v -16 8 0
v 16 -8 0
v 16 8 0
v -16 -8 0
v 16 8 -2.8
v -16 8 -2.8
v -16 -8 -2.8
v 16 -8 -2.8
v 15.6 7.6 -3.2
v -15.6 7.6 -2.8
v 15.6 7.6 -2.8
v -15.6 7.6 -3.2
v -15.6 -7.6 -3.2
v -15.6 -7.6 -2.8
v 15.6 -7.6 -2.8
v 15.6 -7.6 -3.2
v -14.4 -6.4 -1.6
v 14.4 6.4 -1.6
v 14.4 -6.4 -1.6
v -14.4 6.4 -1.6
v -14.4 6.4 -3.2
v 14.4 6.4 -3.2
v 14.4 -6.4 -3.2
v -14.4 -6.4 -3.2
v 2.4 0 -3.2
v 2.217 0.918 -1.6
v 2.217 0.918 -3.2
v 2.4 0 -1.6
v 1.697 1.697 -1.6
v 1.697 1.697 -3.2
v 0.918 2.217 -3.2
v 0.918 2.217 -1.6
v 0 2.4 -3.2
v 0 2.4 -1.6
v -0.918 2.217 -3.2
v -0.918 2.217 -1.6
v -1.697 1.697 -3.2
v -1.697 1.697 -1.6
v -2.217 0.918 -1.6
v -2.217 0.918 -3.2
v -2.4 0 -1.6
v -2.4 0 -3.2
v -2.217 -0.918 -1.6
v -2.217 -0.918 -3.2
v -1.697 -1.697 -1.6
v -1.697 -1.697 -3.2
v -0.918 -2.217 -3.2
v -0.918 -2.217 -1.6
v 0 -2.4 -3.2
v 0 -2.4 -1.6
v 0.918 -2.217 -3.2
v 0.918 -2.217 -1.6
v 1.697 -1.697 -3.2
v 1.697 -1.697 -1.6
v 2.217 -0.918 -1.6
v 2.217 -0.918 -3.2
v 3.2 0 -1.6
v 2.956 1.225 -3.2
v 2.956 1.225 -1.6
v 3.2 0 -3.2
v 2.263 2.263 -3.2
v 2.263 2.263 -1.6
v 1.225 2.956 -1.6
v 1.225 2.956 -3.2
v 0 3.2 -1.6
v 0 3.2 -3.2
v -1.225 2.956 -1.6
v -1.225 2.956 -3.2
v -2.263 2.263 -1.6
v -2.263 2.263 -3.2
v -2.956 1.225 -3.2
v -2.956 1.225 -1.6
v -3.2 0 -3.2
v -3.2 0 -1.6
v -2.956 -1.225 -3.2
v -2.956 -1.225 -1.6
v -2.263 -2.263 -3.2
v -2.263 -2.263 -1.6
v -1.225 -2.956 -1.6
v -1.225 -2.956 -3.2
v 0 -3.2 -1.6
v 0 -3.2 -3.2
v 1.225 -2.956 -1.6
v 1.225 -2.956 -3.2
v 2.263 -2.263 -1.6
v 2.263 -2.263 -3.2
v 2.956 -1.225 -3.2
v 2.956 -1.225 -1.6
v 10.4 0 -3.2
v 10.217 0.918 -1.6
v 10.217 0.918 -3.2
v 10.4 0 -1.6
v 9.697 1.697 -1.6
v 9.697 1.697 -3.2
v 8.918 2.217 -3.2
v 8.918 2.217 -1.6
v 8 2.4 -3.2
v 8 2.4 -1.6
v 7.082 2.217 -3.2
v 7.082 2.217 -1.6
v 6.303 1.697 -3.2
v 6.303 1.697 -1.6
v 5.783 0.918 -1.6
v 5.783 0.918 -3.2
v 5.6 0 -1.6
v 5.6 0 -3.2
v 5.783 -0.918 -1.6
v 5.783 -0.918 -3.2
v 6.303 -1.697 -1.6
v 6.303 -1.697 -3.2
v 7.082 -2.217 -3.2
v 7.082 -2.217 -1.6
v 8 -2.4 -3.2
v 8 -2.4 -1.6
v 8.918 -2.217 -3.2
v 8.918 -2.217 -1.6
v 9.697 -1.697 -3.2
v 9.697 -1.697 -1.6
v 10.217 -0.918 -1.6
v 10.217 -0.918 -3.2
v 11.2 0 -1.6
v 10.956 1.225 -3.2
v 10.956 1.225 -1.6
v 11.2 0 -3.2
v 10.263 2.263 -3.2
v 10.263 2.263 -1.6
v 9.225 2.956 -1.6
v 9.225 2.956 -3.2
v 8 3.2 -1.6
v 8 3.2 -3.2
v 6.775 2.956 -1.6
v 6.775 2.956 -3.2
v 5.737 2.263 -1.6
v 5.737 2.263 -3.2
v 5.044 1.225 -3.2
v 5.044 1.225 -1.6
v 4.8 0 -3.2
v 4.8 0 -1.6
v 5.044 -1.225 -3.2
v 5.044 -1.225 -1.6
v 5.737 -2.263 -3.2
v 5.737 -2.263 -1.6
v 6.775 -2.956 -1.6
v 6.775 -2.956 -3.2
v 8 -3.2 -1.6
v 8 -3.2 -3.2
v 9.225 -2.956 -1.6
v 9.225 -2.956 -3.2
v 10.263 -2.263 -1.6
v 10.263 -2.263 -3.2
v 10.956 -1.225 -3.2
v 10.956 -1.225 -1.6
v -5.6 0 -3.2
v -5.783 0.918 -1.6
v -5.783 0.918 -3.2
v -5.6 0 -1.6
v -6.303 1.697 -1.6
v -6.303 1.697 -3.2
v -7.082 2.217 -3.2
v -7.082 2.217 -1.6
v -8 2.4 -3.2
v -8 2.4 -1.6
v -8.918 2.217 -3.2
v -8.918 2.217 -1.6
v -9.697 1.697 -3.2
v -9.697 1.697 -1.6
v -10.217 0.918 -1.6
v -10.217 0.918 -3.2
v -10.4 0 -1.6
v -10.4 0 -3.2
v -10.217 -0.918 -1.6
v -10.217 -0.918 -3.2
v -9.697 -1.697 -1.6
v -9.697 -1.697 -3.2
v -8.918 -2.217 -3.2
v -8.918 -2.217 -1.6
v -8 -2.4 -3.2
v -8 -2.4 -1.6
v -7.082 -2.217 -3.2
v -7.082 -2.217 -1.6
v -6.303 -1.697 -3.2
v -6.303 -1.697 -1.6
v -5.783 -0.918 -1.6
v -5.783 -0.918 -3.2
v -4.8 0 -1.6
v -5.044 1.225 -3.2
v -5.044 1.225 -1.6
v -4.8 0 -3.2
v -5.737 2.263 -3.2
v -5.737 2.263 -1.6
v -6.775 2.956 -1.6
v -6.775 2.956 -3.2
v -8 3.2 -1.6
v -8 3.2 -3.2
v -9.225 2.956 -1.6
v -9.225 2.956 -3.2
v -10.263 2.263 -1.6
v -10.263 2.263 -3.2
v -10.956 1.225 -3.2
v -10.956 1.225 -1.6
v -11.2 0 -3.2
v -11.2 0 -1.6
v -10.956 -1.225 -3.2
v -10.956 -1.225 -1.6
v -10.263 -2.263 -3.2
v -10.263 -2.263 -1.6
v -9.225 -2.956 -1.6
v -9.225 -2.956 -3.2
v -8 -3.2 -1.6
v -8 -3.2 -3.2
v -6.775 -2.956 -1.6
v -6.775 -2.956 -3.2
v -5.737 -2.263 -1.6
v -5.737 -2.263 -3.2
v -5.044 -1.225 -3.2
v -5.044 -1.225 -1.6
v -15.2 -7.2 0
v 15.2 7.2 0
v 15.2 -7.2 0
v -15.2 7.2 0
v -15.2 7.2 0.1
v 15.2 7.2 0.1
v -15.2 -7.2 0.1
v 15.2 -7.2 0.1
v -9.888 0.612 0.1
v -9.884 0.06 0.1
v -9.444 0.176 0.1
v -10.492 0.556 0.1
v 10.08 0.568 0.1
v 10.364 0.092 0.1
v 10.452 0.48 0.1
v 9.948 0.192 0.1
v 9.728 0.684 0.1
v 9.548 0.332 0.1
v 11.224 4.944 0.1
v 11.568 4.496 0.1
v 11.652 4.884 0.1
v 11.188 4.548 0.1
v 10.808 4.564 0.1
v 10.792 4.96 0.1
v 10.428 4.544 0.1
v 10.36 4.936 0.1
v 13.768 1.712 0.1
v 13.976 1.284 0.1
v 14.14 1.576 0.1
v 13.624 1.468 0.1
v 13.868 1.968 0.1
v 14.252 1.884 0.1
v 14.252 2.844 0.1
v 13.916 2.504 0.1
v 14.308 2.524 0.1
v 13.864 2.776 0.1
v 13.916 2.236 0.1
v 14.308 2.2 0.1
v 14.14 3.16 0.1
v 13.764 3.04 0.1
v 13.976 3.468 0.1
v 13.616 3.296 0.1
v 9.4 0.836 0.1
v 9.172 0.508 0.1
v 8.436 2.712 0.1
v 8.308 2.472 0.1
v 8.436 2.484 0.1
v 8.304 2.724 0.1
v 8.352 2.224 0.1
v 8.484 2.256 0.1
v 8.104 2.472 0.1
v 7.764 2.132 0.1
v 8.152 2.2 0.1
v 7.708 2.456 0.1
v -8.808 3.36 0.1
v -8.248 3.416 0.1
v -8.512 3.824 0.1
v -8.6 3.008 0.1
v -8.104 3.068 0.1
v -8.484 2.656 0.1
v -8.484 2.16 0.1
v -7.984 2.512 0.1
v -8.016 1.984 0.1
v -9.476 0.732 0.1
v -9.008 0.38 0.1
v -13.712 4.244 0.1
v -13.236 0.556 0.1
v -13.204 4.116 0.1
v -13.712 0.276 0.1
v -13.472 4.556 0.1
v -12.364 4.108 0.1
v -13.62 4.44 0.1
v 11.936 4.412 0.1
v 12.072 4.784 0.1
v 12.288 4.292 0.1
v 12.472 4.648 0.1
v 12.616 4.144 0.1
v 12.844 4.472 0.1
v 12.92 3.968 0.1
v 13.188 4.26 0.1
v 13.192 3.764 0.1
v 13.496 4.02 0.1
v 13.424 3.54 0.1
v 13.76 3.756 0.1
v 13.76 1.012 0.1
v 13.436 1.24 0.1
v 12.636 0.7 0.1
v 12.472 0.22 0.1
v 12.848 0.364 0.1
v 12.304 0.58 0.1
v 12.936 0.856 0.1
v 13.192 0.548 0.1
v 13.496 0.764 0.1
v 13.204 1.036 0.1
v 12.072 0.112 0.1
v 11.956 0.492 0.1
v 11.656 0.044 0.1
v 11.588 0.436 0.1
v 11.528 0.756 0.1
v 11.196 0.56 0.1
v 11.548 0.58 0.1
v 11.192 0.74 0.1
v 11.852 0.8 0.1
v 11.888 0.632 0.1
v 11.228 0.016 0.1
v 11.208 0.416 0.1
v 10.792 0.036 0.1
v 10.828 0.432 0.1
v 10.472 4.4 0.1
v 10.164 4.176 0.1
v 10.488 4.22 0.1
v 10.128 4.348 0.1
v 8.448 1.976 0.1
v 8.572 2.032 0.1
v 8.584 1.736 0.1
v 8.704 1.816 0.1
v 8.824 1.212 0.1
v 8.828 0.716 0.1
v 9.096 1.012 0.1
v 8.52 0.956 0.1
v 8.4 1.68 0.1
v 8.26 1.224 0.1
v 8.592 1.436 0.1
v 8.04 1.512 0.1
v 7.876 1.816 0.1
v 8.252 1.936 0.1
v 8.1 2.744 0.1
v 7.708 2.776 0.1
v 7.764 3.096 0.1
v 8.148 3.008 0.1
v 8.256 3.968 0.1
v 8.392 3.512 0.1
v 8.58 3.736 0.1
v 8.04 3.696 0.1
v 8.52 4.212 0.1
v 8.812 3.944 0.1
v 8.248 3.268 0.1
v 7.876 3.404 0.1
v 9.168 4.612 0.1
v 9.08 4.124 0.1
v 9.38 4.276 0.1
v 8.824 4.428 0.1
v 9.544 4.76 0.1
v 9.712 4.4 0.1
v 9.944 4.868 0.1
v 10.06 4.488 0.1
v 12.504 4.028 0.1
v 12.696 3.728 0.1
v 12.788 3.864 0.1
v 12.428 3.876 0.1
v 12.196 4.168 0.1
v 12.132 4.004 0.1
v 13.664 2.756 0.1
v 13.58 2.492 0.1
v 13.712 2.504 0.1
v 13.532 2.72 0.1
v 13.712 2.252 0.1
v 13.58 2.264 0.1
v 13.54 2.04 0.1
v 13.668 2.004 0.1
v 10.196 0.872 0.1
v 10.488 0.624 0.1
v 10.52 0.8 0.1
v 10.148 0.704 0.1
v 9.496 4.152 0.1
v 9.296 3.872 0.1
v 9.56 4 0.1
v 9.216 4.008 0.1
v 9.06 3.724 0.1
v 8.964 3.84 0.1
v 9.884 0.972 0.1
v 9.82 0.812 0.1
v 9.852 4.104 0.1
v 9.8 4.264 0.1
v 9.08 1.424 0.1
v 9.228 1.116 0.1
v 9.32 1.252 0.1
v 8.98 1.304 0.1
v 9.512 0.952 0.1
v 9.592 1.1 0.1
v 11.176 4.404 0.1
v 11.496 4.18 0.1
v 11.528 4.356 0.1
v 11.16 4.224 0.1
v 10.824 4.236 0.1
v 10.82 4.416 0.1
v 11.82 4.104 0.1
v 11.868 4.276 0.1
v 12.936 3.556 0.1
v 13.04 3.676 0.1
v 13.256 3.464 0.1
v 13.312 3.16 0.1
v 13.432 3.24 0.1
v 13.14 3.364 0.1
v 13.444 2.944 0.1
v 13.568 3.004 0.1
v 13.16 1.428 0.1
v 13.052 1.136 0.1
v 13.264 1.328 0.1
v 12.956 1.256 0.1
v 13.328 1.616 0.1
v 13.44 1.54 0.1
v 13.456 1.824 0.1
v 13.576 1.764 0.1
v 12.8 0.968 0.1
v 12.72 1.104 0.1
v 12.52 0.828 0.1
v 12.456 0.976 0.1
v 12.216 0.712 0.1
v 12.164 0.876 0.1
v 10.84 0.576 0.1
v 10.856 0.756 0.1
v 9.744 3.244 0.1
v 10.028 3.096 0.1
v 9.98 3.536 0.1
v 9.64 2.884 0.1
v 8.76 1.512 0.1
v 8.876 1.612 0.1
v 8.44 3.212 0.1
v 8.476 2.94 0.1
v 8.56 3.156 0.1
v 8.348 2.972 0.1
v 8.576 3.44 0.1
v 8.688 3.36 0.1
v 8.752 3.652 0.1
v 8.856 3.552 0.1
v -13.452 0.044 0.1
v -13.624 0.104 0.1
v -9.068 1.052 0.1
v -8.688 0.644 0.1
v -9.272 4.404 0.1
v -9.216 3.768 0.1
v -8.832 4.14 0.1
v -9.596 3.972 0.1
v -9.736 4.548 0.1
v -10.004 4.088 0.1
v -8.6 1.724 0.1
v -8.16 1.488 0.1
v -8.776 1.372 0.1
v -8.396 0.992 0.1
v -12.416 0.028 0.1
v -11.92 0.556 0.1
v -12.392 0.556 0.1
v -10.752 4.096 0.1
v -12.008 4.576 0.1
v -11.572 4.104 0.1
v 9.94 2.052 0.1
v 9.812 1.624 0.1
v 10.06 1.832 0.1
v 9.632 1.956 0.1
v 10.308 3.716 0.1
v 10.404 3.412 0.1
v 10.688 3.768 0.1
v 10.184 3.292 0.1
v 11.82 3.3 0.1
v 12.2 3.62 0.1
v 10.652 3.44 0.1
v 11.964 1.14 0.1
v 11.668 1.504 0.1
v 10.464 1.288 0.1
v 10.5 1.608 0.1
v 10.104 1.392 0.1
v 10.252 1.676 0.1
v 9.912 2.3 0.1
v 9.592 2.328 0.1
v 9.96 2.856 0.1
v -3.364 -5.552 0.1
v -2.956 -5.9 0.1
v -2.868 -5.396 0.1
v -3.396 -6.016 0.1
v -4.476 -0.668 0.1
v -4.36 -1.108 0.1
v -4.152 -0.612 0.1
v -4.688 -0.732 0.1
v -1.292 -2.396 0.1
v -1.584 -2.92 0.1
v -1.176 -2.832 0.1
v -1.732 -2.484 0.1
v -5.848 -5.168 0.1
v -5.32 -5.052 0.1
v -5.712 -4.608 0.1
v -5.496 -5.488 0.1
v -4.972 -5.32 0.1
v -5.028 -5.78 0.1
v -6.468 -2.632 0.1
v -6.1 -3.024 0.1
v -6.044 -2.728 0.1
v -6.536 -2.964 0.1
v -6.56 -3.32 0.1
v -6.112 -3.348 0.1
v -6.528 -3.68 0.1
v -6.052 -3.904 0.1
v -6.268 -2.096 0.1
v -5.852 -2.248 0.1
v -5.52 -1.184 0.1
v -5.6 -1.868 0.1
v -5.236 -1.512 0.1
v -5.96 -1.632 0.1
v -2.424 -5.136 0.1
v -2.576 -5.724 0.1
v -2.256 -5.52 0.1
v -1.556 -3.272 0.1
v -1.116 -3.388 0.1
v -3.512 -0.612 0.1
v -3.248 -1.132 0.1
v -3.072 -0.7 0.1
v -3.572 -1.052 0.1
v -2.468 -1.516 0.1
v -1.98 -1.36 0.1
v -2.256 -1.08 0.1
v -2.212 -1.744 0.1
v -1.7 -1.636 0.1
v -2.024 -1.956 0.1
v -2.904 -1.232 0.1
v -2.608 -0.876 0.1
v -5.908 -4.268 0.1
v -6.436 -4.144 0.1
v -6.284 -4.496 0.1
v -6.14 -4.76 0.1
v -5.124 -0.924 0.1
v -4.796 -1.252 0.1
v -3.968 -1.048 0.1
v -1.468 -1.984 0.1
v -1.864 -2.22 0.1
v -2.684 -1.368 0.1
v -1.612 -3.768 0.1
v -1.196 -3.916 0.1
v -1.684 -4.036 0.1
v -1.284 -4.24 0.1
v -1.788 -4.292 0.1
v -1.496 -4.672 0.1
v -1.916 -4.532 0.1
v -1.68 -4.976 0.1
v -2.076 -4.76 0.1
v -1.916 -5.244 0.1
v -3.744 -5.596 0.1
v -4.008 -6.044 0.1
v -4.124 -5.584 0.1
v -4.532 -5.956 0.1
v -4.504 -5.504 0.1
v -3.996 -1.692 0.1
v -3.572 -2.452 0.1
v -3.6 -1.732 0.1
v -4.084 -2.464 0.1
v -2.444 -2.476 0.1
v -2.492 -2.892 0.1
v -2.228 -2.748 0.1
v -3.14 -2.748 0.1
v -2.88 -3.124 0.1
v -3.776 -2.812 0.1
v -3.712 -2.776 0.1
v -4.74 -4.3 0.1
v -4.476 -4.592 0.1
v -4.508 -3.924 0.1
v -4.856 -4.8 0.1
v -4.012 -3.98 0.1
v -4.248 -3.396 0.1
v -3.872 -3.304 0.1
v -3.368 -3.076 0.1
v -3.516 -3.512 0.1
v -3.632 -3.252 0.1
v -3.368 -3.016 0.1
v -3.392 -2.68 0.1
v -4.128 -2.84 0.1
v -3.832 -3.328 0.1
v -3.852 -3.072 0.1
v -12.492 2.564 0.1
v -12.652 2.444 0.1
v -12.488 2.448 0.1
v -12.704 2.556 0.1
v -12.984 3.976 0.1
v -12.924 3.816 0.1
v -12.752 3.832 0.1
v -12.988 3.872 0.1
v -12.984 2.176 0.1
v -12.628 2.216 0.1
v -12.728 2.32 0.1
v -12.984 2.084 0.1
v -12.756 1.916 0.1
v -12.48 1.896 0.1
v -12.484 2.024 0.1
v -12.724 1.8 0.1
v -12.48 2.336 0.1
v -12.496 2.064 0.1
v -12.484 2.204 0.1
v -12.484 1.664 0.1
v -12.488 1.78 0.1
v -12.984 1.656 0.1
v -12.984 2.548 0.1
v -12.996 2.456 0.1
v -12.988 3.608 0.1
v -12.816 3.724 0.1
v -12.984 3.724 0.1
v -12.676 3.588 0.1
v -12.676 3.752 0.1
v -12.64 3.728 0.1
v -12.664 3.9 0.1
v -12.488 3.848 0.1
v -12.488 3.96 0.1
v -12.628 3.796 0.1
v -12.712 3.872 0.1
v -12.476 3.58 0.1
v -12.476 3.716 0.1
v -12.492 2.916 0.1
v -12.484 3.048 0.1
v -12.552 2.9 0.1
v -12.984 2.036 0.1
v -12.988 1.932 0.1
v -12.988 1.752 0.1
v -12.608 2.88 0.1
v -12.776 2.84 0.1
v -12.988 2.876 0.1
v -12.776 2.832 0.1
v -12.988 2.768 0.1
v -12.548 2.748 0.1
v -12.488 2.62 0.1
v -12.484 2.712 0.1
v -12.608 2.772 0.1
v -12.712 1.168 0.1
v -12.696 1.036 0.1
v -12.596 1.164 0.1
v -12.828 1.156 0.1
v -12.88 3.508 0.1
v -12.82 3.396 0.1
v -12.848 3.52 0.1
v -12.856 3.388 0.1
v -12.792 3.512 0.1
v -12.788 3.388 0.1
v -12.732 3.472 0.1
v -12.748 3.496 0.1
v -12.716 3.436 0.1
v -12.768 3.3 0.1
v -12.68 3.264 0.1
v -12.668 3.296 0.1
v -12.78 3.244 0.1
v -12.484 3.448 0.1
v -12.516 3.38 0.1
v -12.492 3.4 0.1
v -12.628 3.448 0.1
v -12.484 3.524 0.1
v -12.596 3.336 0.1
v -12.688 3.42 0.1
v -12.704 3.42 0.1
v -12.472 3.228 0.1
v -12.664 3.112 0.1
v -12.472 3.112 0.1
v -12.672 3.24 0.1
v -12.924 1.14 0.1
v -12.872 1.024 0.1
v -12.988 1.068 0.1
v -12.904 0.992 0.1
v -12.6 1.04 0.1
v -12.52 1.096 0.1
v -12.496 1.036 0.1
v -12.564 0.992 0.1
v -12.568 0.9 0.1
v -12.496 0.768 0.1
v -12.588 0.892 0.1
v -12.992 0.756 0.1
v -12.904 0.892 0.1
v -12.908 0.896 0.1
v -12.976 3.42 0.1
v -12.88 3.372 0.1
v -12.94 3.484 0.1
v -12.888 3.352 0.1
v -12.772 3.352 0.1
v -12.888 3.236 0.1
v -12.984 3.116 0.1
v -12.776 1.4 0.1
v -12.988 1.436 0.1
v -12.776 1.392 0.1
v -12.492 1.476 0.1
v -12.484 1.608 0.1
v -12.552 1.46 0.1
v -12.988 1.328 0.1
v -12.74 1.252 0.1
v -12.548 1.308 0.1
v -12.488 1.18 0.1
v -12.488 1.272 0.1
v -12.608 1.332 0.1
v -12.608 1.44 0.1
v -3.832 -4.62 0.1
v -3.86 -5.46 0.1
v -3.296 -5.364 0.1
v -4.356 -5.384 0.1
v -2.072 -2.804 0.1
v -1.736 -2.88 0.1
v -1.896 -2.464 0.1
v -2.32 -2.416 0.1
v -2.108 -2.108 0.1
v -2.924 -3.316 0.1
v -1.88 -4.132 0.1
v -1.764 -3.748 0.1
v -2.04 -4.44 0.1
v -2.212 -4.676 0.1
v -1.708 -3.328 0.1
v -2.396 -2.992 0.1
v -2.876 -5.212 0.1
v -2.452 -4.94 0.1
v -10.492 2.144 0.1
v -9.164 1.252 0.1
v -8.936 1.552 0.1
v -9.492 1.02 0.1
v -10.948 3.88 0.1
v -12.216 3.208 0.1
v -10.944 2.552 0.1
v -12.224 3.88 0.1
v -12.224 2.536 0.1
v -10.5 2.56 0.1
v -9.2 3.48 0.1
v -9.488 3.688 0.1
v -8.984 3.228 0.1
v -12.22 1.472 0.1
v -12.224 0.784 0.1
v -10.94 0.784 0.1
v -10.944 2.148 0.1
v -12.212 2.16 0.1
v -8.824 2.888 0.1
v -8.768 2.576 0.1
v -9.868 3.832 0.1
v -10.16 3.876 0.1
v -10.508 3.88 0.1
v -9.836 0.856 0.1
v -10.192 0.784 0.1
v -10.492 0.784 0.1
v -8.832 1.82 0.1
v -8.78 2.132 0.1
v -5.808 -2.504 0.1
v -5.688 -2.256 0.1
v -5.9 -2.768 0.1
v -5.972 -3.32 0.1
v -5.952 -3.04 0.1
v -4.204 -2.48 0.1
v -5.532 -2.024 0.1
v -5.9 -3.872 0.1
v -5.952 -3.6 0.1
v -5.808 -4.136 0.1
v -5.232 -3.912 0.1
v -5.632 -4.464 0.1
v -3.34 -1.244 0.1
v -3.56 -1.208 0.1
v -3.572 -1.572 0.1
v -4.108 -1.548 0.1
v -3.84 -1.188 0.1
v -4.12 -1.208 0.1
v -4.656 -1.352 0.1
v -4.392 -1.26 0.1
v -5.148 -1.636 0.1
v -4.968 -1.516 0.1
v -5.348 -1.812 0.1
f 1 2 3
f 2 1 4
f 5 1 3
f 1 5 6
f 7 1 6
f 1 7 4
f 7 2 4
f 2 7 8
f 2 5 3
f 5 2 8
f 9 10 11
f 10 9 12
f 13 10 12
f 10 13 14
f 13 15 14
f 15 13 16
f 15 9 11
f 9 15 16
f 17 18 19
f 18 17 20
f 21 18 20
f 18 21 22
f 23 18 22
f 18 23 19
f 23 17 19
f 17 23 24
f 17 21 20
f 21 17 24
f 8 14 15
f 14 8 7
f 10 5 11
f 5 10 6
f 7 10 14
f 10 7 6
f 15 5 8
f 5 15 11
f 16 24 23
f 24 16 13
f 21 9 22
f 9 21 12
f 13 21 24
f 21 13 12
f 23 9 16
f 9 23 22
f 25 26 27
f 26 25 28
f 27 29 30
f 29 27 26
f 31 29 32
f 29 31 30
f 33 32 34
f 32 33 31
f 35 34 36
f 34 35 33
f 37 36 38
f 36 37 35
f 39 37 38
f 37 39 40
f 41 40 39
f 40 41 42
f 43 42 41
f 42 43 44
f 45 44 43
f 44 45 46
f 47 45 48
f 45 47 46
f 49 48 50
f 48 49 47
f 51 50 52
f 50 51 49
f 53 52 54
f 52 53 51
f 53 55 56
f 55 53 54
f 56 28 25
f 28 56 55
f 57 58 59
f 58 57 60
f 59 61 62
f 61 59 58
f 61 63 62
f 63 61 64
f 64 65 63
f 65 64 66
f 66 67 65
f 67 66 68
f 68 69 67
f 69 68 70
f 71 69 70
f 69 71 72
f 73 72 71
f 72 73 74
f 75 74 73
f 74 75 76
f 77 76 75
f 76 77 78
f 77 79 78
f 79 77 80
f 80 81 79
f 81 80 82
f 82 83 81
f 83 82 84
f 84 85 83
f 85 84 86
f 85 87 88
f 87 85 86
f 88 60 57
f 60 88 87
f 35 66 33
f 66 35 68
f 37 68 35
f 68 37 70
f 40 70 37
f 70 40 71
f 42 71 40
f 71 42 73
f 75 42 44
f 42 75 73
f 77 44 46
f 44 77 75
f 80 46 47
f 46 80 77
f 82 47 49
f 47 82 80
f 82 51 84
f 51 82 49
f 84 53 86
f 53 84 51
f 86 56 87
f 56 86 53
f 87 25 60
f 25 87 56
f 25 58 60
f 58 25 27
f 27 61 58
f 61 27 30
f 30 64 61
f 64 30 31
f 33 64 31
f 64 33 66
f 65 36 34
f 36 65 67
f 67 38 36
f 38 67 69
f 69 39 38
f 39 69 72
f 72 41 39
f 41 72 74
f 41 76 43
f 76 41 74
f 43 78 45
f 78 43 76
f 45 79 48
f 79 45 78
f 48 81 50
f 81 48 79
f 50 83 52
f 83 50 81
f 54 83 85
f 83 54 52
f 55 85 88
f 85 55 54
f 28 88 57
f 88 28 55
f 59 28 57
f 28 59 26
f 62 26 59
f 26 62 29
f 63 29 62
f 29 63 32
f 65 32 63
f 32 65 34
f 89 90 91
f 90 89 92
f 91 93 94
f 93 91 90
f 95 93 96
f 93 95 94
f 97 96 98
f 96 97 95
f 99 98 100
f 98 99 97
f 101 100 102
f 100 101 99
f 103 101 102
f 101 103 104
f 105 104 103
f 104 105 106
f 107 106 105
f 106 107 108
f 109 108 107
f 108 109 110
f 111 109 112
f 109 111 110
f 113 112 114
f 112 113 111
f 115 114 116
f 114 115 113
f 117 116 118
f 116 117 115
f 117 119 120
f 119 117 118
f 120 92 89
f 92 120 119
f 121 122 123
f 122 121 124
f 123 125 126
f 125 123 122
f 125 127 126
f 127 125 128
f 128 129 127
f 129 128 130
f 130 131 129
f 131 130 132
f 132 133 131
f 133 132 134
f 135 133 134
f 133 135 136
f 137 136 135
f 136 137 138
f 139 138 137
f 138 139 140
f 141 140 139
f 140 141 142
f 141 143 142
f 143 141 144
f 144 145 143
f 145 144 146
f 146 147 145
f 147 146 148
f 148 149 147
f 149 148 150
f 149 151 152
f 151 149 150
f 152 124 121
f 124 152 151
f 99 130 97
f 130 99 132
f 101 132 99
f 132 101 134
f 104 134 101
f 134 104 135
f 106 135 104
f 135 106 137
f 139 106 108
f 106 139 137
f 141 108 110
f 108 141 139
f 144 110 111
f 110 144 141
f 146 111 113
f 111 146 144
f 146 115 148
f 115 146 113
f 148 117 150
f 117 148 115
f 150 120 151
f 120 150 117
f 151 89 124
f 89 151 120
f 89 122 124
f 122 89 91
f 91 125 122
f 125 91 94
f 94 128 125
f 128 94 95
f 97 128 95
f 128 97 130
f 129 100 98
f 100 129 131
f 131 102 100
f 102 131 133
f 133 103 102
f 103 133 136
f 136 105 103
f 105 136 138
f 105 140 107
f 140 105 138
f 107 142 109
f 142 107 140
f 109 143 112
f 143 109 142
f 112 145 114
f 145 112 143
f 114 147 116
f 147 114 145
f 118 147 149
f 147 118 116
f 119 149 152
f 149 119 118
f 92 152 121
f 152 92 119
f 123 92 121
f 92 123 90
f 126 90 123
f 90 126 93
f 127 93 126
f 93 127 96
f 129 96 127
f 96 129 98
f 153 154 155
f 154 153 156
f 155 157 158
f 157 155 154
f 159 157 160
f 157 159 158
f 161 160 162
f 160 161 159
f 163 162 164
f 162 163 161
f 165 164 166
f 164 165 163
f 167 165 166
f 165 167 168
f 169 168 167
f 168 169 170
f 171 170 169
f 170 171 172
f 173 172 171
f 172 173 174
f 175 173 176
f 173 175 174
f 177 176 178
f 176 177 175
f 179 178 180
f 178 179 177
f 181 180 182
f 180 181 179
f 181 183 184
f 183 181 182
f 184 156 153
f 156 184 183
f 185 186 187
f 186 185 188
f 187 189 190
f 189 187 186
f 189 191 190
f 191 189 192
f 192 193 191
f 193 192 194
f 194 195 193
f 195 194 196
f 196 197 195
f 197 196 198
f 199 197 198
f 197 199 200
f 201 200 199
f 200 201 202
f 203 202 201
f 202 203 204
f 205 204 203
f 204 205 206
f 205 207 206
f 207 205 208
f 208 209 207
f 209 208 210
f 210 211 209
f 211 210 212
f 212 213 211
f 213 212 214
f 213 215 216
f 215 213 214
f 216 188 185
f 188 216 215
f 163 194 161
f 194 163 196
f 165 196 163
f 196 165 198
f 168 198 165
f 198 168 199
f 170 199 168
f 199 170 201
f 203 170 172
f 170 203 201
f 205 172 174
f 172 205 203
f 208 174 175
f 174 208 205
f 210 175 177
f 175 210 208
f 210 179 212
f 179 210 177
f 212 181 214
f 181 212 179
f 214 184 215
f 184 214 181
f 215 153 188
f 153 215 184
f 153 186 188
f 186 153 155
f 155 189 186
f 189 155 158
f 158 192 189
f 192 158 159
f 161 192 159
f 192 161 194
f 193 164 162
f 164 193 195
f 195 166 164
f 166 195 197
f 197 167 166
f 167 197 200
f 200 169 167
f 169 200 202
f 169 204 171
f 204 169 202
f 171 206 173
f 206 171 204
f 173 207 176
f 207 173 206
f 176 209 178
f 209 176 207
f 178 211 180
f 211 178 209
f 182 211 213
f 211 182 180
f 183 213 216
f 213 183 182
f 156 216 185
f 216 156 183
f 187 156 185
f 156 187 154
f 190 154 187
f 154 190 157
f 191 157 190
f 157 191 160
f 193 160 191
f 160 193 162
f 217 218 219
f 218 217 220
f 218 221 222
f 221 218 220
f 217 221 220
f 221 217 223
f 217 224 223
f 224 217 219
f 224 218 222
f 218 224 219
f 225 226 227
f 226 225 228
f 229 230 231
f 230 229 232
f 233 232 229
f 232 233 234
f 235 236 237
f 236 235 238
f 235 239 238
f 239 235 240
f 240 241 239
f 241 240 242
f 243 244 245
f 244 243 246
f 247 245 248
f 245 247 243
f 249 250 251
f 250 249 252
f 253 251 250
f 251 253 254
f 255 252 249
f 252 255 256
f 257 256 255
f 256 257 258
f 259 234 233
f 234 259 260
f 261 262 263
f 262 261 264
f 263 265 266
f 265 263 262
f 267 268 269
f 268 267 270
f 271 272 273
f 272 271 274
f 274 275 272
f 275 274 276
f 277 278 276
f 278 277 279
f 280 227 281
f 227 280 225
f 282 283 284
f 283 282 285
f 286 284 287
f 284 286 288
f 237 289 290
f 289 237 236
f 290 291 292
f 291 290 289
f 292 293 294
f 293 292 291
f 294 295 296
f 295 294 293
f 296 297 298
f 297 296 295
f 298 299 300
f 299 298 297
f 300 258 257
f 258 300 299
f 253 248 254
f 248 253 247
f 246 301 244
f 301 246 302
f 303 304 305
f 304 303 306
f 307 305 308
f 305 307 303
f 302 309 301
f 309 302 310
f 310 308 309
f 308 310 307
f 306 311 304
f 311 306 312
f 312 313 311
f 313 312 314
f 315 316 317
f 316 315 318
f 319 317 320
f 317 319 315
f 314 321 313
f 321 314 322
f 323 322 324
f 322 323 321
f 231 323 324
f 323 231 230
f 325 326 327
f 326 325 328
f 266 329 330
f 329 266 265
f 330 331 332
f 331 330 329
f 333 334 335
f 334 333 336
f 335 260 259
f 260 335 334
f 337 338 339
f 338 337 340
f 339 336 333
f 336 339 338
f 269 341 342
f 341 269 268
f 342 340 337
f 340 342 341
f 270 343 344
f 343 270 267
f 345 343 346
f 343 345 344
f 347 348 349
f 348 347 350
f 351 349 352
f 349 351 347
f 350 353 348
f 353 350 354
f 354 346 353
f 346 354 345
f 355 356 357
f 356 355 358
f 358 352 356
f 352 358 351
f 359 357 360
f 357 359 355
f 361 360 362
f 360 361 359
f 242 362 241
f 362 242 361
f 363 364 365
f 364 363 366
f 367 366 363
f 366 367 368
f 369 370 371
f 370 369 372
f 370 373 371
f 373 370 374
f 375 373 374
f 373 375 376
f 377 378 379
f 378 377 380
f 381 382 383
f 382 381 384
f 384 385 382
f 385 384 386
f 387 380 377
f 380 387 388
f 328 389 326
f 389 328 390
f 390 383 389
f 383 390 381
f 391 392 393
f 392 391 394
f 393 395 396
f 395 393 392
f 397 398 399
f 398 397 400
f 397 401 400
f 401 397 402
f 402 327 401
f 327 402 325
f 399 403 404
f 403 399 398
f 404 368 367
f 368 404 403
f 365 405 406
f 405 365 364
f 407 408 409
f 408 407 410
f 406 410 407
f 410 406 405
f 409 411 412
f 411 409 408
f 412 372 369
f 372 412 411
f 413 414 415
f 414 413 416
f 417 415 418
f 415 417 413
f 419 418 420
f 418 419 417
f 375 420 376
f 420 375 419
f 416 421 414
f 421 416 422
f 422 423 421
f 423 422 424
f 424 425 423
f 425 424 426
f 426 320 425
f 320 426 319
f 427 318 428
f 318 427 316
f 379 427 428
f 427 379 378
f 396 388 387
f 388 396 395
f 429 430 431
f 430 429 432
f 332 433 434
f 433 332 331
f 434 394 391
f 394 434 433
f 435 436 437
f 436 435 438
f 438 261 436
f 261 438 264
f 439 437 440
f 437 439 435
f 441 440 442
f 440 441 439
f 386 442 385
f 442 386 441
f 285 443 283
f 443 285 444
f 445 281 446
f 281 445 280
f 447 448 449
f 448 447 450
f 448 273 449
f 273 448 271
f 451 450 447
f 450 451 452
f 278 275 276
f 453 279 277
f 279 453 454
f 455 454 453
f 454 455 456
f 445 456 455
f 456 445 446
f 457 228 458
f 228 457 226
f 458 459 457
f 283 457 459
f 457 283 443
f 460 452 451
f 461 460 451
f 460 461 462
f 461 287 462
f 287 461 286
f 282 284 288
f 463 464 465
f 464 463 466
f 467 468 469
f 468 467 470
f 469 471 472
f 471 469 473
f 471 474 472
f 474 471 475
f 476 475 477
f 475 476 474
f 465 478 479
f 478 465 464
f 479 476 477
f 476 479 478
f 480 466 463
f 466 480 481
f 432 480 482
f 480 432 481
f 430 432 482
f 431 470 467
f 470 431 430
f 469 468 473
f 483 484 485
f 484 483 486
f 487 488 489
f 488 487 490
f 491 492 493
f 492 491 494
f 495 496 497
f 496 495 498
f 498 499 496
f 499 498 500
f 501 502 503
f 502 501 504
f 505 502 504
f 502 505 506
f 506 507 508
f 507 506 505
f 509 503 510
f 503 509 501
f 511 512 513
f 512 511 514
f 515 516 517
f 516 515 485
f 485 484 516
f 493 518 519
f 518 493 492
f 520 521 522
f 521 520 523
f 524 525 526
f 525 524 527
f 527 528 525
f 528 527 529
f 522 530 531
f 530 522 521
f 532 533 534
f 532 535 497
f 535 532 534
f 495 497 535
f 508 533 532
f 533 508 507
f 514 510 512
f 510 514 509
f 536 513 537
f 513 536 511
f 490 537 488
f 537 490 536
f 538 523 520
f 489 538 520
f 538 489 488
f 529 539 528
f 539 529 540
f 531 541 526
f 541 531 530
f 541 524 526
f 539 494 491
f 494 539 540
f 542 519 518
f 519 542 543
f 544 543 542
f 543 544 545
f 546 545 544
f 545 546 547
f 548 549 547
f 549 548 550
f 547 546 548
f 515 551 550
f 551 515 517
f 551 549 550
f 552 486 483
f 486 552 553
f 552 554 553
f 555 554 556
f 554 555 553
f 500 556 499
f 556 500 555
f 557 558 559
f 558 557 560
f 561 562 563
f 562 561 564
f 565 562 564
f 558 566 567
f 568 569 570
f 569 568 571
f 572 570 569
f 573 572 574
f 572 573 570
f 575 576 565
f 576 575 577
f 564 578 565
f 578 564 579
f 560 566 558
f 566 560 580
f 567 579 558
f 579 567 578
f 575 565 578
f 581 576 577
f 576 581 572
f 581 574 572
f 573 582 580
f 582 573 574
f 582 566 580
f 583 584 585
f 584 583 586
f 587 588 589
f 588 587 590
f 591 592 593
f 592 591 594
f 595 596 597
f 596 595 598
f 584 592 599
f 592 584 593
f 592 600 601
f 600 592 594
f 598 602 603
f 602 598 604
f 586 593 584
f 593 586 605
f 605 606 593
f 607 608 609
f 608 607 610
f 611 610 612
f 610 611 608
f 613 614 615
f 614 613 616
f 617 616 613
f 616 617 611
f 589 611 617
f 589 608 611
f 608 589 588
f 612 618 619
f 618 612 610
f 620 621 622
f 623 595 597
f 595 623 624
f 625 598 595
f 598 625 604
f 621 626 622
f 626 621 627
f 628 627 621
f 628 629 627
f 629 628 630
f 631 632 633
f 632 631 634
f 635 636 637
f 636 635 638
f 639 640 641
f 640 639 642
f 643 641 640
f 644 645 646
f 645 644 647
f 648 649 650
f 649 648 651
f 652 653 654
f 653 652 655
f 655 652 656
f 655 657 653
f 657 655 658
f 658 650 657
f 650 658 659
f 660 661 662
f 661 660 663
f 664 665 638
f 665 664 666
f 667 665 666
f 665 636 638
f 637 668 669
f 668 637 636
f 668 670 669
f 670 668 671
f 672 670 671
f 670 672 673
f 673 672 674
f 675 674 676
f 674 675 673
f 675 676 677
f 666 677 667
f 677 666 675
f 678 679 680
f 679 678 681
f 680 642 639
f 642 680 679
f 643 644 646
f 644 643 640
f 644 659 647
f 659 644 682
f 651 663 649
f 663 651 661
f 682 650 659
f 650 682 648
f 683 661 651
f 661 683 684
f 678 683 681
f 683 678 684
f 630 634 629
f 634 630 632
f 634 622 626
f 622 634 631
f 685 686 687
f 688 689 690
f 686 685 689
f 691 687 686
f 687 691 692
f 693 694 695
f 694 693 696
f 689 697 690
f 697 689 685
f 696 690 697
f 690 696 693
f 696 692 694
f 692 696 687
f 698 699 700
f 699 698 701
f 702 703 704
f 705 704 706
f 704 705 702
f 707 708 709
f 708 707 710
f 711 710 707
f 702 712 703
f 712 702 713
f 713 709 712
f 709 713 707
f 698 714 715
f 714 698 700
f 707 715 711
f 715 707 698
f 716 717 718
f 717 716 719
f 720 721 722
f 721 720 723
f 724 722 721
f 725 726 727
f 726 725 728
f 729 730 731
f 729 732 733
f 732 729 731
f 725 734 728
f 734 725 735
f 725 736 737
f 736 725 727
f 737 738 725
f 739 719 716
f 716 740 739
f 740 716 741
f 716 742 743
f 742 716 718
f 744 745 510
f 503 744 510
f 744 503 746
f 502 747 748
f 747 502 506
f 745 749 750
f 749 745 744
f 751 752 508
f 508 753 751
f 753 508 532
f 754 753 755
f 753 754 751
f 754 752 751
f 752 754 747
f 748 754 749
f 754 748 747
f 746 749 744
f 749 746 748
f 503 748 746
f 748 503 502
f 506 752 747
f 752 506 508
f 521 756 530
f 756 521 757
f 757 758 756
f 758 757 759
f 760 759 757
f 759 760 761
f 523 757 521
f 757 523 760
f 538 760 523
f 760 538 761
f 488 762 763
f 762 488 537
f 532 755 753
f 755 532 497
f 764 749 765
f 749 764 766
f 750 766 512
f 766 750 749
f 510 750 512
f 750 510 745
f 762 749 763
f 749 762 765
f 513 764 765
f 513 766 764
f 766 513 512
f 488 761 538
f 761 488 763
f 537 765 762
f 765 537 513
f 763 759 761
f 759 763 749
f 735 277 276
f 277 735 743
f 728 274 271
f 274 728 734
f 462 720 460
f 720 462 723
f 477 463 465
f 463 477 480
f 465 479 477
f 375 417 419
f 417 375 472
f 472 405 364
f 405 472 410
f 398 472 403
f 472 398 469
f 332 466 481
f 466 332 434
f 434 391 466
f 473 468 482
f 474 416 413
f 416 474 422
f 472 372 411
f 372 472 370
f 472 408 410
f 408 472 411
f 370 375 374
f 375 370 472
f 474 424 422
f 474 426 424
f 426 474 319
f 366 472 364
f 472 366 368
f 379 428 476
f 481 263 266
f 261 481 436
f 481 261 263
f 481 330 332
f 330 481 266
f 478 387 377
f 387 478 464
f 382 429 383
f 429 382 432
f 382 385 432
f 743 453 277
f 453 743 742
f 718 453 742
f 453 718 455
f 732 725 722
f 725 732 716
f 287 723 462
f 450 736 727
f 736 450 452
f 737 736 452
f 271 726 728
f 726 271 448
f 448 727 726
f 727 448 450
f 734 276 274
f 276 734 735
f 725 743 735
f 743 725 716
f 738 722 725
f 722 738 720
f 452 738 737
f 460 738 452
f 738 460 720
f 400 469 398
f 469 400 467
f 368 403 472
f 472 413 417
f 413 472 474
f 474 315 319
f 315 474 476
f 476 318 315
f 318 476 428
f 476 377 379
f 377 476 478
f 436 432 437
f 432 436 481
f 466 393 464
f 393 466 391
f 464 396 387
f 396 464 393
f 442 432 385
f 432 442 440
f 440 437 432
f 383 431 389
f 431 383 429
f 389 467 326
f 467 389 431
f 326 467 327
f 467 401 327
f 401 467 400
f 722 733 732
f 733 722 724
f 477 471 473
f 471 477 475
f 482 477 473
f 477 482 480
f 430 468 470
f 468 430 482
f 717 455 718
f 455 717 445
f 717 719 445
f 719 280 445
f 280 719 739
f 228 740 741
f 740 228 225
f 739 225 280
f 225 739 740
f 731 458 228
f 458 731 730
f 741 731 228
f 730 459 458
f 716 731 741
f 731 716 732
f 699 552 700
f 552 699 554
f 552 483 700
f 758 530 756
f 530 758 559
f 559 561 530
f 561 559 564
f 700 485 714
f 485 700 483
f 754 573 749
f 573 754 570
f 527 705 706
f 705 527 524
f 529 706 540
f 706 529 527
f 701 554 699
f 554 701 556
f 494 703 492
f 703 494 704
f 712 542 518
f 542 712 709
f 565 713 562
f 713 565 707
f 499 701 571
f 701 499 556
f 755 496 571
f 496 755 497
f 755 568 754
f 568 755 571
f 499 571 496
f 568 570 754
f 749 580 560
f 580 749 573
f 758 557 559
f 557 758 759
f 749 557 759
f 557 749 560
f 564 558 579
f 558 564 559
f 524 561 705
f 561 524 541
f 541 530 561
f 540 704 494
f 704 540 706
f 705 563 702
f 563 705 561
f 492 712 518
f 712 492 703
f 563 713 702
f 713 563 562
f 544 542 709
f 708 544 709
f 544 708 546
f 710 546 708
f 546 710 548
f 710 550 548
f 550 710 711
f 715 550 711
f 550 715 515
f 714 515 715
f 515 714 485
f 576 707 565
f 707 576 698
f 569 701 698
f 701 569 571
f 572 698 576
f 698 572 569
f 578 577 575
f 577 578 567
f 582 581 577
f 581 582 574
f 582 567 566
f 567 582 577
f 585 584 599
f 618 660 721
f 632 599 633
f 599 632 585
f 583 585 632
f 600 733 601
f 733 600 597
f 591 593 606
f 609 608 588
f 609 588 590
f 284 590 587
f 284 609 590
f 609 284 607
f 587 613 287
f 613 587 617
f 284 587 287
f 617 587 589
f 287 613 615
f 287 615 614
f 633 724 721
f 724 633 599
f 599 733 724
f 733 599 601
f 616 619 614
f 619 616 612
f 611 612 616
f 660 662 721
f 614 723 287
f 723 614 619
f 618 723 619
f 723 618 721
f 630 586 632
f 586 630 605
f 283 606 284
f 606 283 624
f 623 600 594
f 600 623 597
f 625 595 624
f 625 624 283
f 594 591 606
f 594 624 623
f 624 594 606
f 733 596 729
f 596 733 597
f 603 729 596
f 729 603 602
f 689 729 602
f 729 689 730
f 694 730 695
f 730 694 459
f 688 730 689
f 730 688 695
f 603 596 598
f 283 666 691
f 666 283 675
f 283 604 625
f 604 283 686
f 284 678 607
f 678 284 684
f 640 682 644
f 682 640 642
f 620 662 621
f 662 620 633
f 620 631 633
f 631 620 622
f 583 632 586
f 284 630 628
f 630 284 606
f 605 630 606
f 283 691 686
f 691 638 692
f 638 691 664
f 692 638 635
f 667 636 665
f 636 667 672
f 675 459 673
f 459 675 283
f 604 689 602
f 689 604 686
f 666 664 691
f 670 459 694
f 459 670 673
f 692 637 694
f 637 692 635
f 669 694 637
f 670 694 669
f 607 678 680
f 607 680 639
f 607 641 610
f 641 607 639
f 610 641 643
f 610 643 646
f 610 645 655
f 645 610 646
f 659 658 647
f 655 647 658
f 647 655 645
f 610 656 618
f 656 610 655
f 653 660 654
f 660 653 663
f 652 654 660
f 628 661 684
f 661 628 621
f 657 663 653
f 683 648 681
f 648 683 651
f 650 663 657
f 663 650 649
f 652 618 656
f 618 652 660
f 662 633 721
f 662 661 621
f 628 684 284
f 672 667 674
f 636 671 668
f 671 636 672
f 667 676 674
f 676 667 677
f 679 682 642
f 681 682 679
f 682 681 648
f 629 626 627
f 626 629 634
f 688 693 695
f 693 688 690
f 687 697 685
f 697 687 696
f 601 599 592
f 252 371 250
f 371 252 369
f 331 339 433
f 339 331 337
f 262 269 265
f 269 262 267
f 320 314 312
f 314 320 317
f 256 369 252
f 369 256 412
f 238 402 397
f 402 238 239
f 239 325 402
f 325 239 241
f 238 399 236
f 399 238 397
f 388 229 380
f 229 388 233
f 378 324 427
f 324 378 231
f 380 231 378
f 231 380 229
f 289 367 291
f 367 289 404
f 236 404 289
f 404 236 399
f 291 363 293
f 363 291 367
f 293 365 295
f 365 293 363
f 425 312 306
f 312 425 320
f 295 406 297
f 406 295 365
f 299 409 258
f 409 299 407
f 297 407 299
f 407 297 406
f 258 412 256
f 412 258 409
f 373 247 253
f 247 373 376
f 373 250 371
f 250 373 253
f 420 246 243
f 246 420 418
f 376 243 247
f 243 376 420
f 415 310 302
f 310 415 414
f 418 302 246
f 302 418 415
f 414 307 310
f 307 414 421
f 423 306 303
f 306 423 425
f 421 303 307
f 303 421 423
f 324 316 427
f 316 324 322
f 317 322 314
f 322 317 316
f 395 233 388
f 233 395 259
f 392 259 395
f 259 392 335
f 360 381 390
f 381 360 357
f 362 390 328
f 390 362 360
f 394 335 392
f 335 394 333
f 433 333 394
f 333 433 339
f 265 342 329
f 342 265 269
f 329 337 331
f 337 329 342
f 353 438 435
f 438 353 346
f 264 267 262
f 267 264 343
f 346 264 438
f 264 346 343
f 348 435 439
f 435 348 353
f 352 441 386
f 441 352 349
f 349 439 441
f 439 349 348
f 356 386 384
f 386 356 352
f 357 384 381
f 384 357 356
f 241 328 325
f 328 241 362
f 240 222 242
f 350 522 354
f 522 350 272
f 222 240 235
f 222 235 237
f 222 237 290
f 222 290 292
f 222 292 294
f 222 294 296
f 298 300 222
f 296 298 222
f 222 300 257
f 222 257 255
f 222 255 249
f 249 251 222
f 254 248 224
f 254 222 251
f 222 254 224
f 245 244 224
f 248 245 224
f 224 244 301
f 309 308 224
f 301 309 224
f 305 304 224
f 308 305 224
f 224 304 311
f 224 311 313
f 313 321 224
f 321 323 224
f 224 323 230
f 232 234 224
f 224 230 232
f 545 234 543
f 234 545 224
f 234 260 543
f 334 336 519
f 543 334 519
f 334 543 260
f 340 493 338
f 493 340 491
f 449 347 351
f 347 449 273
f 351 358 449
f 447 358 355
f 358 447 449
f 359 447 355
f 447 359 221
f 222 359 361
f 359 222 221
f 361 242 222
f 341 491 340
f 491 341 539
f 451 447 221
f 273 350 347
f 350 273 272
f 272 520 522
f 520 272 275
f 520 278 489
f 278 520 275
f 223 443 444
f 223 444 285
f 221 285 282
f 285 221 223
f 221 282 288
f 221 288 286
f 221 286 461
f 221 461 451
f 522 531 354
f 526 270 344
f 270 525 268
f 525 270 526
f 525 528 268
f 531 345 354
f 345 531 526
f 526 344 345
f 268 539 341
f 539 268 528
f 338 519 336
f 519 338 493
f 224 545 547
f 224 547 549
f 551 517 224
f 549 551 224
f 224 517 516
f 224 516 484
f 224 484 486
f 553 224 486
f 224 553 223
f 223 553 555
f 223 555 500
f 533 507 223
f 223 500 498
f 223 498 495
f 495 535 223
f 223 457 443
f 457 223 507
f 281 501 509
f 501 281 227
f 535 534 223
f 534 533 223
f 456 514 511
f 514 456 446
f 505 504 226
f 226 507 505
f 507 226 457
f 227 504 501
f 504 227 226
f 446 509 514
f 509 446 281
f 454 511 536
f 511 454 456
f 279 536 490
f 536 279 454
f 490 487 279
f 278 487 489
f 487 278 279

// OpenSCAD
use <../lib.scad>
use <6296256c.scad>
use <87079.scad>
function ldraw_lib__87079d17() = [
// 0 Tile  2 x  4 with France, Germany and Denmark Stickers on Medium Nougat Background Sticker
// 0 Name: 87079d17.dat
// 0 Author: Evert-Jan Boer [ejboer]
// 0 !LDRAW_ORG Shortcut UPDATE 2026-07
// 0 !LICENSE Licensed under CC BY 4.0 : see CAreadme.txt
// 
// 0 BFC CERTIFY CCW
  [0,"BFC","CERTIFY"],
  [0,"BFC","CCW"],
// 
// 0 !CATEGORY Sticker Shortcut
// 0 !KEYWORDS Bricklink 87079pb0904, Fiat 500, set 10271, set 77942
// 
// 0 !HISTORY 2026-07-30 [OrionP] Official Update 2026-07
// 
// 1 16 0 0 0 1 0 0 0 1 0 0 0 1 87079.dat
  [1,16,0,0,0,1,0,0,0,1,0,0,0,1, ldraw_lib__87079()],
// 1 16 0 0 0 1 0 0 0 1 0 0 0 1 6296256c.dat
  [1,16,0,0,0,1,0,0,0,1,0,0,0,1, ldraw_lib__6296256c()],
];
module ldraw_lib__87079d17(step=0, col=false, unit=2/5, alt=false, line=0.2, solid=!$preview)
    makepoly(ldraw_lib__87079d17(), step=step, col=col, unit=unit, alt=alt, line=line, solid=solid);
ldraw_lib__87079d17(line=0.2);
